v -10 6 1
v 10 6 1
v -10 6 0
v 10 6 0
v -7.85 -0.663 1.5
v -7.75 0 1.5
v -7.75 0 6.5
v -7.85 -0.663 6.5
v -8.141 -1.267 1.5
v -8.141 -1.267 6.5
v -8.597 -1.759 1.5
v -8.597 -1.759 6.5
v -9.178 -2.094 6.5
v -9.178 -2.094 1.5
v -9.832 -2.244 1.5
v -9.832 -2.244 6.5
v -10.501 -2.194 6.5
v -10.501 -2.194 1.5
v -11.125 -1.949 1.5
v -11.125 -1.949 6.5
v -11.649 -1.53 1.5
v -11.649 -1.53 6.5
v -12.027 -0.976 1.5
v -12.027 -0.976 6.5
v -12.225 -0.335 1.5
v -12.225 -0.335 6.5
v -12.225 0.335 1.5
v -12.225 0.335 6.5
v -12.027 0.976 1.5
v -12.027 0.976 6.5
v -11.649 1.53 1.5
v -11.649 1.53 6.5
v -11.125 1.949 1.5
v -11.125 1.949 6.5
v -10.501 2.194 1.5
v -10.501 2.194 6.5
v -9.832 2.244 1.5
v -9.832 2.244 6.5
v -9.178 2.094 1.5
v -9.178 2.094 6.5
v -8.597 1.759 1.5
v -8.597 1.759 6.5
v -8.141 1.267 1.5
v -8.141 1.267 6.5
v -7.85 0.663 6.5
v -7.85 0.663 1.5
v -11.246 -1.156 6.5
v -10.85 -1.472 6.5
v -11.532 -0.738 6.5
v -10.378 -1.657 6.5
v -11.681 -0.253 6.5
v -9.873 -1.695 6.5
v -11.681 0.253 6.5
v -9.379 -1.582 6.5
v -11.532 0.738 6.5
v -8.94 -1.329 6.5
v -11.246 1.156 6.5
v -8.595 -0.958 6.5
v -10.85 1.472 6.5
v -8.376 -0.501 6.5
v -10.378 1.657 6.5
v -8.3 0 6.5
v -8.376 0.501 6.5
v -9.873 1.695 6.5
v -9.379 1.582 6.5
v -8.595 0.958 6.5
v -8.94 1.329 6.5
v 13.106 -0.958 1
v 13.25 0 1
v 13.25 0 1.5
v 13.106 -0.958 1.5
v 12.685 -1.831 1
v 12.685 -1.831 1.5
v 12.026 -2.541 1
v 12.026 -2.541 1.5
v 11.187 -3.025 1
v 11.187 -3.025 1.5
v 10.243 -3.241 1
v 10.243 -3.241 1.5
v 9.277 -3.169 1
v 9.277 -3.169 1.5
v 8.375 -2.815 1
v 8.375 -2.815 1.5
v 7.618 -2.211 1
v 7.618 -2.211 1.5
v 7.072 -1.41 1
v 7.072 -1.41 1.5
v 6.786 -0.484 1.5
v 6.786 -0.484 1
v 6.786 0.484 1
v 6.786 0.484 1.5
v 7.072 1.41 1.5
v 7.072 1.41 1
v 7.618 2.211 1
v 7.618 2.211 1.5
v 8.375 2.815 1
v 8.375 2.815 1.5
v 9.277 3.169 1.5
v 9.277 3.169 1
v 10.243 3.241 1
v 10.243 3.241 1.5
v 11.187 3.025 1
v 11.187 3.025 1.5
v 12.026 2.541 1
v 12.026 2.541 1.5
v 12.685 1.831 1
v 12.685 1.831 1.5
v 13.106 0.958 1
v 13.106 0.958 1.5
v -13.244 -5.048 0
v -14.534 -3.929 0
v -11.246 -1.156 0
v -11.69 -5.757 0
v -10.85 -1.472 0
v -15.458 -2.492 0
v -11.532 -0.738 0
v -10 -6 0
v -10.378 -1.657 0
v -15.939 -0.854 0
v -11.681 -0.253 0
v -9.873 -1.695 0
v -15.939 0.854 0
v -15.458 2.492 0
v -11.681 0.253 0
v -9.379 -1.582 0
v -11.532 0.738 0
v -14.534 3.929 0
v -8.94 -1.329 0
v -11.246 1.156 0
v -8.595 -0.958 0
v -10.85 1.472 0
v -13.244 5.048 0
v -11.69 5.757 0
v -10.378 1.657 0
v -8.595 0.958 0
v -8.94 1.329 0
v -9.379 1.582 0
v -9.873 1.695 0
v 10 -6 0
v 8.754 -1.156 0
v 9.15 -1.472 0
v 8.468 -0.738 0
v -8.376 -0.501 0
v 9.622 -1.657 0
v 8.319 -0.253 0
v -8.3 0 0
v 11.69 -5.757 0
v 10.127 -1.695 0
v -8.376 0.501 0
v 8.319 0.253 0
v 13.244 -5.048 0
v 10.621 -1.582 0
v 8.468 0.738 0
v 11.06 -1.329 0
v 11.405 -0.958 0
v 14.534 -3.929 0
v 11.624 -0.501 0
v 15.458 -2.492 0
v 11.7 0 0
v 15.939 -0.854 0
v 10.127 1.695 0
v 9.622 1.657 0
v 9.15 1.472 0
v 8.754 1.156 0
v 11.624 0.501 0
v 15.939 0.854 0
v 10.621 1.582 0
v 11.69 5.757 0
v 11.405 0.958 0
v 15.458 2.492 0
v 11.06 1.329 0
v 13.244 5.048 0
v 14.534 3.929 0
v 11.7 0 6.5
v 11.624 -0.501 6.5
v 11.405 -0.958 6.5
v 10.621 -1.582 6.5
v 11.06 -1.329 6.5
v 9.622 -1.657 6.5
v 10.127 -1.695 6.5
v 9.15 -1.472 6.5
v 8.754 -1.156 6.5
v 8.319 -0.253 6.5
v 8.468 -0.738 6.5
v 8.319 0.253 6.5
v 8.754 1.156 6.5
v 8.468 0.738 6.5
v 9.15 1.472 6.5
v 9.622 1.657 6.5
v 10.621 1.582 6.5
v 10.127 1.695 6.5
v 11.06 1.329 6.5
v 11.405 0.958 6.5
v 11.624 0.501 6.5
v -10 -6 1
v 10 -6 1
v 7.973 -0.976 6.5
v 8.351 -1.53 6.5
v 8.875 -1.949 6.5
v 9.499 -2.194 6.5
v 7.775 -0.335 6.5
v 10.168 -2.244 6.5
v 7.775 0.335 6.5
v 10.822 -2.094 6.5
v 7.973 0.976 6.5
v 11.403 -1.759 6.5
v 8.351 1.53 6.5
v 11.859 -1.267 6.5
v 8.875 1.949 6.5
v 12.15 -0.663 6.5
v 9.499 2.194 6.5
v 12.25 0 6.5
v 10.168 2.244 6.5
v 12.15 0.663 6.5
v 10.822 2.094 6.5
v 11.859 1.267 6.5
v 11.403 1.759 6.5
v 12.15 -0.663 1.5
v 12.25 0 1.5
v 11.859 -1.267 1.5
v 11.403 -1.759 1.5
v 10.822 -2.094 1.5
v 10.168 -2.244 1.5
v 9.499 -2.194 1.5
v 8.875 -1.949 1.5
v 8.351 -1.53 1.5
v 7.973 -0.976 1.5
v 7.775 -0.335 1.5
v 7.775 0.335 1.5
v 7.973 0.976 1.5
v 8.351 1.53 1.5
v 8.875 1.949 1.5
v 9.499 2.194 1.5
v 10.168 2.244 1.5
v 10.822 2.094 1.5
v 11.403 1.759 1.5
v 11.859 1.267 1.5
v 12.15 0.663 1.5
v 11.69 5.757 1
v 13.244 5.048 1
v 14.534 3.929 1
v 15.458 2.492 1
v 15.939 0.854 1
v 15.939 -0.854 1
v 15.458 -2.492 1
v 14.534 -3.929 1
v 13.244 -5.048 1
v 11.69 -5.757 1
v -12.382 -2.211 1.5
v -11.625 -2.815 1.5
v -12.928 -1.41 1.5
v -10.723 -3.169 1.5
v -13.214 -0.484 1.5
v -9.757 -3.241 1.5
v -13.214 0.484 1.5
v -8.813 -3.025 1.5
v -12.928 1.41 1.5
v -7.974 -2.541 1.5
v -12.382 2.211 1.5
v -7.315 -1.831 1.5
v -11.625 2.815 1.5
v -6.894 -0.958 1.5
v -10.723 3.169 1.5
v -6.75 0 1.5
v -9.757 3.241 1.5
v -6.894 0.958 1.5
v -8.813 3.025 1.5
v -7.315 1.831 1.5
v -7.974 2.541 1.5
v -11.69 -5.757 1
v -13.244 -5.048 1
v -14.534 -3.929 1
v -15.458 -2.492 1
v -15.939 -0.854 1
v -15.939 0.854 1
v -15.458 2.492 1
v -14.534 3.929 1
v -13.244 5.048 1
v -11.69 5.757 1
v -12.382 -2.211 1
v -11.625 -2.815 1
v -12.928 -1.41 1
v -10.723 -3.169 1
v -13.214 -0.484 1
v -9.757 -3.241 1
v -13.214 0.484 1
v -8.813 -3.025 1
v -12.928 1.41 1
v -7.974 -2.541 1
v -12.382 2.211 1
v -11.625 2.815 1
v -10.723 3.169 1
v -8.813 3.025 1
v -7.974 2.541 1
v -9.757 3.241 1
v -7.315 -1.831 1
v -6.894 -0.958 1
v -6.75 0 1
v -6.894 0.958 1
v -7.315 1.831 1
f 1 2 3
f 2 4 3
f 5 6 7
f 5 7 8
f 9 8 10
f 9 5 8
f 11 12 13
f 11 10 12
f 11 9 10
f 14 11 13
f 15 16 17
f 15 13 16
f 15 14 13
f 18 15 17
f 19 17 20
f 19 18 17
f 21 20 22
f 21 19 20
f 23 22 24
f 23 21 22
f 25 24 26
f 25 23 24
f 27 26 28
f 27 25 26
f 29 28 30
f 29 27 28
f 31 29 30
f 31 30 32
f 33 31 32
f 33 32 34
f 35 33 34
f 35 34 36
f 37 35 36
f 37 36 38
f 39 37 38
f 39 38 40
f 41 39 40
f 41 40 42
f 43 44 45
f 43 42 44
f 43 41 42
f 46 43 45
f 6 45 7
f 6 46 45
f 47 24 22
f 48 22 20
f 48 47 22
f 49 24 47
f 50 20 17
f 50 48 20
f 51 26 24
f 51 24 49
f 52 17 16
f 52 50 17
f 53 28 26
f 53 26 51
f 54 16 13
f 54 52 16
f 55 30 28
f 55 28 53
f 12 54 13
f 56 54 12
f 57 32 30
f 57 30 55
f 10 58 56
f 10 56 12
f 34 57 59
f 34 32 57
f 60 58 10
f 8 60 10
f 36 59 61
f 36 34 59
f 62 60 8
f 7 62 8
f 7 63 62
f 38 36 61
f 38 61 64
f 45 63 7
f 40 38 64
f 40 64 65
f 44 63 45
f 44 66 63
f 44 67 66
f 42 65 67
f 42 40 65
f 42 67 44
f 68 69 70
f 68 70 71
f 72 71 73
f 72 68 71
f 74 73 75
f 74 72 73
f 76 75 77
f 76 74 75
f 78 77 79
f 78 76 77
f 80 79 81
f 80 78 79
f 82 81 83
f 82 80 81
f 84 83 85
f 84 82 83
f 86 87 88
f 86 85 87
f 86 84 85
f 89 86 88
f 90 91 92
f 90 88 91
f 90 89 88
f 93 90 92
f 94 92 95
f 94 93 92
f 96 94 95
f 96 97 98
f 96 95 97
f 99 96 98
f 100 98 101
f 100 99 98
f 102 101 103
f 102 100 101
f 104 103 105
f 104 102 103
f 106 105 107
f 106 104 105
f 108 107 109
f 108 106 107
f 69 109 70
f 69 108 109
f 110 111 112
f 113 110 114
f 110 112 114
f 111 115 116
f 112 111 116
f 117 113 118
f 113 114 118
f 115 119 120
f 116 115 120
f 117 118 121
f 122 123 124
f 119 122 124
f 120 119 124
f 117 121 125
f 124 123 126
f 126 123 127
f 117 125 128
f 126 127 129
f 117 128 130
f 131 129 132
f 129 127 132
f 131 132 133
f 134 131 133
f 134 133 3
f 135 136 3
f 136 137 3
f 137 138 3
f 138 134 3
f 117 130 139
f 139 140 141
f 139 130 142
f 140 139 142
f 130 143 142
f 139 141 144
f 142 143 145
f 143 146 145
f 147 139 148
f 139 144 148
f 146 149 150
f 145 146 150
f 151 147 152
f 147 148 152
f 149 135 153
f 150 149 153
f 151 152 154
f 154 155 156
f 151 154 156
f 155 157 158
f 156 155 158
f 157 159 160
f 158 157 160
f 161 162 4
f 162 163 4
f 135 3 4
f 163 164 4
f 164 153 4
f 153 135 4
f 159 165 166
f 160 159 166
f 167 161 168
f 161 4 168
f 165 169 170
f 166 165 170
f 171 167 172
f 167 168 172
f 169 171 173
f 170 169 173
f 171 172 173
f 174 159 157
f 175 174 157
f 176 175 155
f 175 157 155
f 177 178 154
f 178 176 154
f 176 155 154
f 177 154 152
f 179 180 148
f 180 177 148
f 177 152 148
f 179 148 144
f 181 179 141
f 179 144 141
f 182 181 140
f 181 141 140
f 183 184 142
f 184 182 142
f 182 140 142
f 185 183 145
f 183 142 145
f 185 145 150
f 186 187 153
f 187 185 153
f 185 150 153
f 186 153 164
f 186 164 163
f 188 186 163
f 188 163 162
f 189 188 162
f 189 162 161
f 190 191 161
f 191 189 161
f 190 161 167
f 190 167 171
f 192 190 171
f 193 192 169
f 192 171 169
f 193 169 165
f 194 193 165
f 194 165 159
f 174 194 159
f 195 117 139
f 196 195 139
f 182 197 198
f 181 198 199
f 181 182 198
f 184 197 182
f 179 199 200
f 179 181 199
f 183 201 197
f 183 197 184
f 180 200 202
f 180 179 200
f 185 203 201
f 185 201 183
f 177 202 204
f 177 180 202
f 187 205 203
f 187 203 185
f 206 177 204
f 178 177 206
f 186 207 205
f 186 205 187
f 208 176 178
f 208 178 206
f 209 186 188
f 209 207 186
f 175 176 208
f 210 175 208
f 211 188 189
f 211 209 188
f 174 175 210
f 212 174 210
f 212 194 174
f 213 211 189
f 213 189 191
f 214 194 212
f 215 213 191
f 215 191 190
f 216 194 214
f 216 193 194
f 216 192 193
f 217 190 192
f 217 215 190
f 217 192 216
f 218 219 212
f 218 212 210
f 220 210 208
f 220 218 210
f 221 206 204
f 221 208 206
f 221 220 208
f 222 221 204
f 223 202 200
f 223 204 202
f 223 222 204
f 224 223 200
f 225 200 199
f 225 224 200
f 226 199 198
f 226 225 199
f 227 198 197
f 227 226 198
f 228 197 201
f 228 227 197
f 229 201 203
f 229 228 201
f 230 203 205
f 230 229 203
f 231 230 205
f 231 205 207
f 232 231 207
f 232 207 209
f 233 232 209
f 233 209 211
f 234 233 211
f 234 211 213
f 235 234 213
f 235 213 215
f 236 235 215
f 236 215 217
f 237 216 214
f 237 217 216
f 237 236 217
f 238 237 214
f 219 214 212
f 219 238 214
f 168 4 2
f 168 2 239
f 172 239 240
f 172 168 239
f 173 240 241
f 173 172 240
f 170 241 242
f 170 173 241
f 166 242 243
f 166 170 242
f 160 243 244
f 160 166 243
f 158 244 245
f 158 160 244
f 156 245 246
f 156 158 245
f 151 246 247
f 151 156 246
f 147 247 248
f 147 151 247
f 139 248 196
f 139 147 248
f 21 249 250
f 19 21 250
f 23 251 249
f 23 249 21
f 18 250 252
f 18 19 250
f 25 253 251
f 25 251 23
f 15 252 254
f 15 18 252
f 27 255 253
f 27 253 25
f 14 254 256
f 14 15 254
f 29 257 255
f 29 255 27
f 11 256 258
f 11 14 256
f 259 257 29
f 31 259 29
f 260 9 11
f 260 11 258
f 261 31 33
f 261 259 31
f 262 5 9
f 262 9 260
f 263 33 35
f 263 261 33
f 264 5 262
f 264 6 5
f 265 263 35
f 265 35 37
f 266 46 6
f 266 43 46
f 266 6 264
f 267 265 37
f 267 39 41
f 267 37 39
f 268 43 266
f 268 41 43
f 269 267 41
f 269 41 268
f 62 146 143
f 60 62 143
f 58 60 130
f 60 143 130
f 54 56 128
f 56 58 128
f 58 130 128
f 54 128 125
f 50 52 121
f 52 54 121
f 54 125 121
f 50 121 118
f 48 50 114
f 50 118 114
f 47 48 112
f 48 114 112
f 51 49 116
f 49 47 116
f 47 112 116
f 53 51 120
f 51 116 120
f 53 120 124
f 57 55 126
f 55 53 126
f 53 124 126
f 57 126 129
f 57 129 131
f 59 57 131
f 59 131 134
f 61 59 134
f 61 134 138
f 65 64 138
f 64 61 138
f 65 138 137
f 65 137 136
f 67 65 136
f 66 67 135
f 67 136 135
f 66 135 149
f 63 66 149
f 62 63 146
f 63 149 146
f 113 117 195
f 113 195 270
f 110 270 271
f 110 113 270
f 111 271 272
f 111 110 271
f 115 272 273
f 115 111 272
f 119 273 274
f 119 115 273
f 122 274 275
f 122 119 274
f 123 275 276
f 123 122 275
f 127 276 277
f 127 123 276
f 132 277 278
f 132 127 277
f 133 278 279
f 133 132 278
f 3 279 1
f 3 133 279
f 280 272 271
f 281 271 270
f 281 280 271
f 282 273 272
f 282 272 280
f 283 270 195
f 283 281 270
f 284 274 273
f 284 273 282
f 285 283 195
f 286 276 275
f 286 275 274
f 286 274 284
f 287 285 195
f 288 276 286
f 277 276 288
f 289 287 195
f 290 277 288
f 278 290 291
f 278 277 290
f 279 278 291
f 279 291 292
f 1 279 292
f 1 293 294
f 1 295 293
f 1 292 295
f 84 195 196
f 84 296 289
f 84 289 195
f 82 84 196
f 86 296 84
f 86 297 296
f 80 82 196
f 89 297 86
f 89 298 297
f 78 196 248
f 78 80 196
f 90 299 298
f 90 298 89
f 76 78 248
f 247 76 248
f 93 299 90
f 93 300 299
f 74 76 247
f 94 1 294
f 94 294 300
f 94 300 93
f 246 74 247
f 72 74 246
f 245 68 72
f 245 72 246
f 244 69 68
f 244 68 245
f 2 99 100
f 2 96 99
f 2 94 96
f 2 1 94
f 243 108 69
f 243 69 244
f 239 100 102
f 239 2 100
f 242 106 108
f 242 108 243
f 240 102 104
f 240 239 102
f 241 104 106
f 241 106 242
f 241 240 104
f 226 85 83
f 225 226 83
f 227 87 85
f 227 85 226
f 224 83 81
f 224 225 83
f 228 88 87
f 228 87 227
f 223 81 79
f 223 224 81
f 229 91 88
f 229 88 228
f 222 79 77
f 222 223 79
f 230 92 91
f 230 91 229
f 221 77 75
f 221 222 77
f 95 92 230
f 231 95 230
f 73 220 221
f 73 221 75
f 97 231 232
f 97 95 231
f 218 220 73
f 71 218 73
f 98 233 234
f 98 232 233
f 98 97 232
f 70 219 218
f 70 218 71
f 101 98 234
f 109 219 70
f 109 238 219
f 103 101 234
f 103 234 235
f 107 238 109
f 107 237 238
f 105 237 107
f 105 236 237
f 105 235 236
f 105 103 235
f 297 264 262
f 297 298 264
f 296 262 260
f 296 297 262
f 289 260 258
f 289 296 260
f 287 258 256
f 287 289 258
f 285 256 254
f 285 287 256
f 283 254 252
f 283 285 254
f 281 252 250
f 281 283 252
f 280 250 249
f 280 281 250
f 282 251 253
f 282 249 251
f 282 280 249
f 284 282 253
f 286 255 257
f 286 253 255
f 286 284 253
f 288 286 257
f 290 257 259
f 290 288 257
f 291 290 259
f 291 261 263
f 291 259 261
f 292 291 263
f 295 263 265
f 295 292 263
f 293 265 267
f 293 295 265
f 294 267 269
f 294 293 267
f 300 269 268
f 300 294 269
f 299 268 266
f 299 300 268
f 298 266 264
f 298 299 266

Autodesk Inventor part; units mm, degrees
ref_plane "YZ Plane" through (0, 0, 0) normal (1, 0, 0) x (0, 1, 0)
ref_plane "XZ Plane" through (0, 0, 0) normal (0, 1, 0) x (-1, 0, 0)
ref_plane "XY Plane" through (0, 0, 0) normal (0, 0, 1) x (1, 0, 0)
sketch "Sketch1" plane through (0, 0, 0) normal (0, 0, 1) x (1, 0, 0)
  line L0 (-10, 0) -> (10, 0) construction
  line L1 (-10, -6) -> (10, -6)
  line L2 (10, 6) -> (-10, 6)
  arc A0 (-10, 6) -> (-10, -6) centre (-10, 0) ccw
  arc A1 (10, -6) -> (10, 6) centre (10, 0) ccw
  circle A2 centre (-10, 0) radius 1.7
  circle A3 centre (10, 0) radius 1.7
  point P0 (0, 0)
  point P1 (0, 0)
  dimension "d0" = 20
  dimension "d1" = 6
  dimension "d2" = 3.4
extrude "Extrusion1" add sketch "Sketch1" along normal blind 1
sketch "Sketch2" plane through (0, 0, 1) normal (0, 0, 1) x (1, 0, 0)
  circle A0 centre (10, 0) radius 1.7 projected
  circle A1 centre (10, 0) radius 2.25
  circle A2 centre (-10, 0) radius 1.7 projected
  circle A3 centre (-10, 0) radius 2.25
  point P0 (0, 0)
  dimension "d5" = 4.5
  dimension "d6" = 4.5
extrude "Extrusion2" add sketch "Sketch2" along normal blind 5.5
sketch "Sketch3" plane through (0, 0, 1) normal (0, 0, 1) x (1, 0, 0)
  circle A0 centre (10, 0) radius 2.25 projected
  circle A1 centre (-10, 0) radius 2.25 projected
  circle A2 centre (10, 0) radius 2.25 projected
  arc A3 (10, -6) -> (10, 6) centre (10, 0) ccw projected
  line L0 (10, 6) -> (-10, 6) projected
  arc A4 (-10, 6) -> (-10, -6) centre (-10, 0) ccw projected
  line L1 (-10, -6) -> (10, -6) projected
  circle A5 centre (10, 0) radius 3.25
  circle A6 centre (-10, 0) radius 3.25
  point P0 (0, 0)
  dimension "d9" = 6.5
extrude "Extrusion3" add sketch "Sketch3" along normal blind 0.5 contours A5 | A6
equation "\"d6\" = d5"
properties part number "Belt Retaining Guide"
